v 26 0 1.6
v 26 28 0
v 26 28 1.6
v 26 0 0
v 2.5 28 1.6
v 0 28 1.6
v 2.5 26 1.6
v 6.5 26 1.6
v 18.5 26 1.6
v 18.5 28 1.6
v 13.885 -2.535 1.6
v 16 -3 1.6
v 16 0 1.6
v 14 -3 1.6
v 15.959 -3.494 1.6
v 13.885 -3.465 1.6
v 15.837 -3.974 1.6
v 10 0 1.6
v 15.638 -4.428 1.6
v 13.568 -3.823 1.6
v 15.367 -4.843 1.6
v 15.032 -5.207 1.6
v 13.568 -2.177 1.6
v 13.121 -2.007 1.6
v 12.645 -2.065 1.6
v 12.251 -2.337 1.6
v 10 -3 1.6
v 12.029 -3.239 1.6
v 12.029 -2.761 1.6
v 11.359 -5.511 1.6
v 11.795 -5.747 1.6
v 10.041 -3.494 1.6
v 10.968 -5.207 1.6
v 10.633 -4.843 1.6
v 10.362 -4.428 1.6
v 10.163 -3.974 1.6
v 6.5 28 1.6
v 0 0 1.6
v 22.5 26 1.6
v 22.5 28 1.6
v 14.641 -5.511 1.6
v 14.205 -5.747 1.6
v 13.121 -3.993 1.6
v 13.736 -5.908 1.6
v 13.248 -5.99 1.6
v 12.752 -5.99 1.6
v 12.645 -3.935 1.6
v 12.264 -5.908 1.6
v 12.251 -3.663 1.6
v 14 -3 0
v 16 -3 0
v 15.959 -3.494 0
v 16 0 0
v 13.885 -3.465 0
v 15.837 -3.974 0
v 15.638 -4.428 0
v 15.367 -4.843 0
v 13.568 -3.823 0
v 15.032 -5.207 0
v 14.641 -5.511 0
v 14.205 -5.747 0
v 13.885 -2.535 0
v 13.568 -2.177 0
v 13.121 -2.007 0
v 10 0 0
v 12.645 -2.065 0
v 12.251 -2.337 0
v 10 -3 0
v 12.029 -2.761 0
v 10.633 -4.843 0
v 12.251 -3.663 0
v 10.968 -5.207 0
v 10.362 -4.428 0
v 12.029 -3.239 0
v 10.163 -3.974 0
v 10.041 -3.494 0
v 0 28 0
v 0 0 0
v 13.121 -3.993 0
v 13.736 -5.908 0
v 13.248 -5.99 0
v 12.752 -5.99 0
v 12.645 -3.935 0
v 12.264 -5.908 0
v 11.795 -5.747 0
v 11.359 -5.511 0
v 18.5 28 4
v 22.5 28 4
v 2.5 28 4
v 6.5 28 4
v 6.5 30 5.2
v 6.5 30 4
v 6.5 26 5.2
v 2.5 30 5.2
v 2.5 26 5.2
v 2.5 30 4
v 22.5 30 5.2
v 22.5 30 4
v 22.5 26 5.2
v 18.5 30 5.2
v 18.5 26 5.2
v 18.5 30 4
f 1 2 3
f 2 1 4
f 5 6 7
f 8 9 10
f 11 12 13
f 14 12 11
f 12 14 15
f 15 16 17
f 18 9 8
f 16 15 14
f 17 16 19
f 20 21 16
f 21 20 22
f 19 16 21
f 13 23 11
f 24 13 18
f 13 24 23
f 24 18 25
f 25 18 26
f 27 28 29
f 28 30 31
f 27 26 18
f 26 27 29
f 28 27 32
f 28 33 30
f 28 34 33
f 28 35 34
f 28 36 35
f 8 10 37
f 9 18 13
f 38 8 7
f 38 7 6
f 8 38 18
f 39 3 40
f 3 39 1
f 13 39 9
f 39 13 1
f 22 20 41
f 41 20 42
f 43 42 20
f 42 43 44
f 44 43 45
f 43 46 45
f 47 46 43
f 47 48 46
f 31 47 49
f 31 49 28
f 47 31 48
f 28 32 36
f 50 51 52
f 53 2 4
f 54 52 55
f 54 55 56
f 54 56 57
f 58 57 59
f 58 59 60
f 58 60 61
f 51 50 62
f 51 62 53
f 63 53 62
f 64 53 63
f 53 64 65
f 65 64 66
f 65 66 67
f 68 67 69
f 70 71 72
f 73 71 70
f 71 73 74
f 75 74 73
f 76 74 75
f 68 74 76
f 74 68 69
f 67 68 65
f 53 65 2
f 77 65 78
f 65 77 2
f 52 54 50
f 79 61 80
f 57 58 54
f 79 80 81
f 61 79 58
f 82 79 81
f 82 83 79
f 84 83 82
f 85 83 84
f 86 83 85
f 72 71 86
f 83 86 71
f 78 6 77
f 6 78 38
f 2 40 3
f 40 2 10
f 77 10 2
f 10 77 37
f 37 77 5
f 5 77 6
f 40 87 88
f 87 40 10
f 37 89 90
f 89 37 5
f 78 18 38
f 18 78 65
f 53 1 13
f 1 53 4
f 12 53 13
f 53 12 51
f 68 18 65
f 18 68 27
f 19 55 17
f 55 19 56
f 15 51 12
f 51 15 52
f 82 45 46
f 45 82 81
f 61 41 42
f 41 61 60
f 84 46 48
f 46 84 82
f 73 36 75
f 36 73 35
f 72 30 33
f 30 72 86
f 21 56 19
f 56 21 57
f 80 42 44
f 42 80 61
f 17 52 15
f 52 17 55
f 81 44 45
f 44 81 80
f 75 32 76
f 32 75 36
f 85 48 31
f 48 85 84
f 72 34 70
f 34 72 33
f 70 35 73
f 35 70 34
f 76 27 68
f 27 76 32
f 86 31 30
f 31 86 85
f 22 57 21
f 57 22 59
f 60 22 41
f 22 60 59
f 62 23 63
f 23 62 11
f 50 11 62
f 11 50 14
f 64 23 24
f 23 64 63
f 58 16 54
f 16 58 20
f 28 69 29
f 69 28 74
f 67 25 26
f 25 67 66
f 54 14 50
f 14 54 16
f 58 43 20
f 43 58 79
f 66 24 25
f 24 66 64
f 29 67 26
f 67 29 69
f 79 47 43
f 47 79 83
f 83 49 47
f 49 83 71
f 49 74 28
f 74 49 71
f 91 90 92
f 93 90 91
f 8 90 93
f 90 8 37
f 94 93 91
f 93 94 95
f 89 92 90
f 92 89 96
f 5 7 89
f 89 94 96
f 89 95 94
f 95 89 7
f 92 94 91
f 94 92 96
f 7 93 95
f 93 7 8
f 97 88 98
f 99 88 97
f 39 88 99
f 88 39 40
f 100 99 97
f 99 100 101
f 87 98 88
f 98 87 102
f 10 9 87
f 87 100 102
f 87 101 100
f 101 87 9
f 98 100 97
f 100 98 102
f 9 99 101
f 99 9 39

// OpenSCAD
$fs=1/2;
$fa=1/2;
difference() {
  union() {
    cube([26,28,1.6]);
    translate([10,-3,0])cube([6,3,1.6]);
    translate([13,-3,0])cylinder(d=6,h=1.6);
  }
  translate([13,-3,-0.1])cylinder(d=2,h=1.8);
}
translate([2.5,26,4])cube([4,4,1.2]);
translate([2.5,26,0])cube([4,2,4]);

translate([18.5,26,4])cube([4,4,1.2]);
translate([18.5,26,0])cube([4,2,4]);
